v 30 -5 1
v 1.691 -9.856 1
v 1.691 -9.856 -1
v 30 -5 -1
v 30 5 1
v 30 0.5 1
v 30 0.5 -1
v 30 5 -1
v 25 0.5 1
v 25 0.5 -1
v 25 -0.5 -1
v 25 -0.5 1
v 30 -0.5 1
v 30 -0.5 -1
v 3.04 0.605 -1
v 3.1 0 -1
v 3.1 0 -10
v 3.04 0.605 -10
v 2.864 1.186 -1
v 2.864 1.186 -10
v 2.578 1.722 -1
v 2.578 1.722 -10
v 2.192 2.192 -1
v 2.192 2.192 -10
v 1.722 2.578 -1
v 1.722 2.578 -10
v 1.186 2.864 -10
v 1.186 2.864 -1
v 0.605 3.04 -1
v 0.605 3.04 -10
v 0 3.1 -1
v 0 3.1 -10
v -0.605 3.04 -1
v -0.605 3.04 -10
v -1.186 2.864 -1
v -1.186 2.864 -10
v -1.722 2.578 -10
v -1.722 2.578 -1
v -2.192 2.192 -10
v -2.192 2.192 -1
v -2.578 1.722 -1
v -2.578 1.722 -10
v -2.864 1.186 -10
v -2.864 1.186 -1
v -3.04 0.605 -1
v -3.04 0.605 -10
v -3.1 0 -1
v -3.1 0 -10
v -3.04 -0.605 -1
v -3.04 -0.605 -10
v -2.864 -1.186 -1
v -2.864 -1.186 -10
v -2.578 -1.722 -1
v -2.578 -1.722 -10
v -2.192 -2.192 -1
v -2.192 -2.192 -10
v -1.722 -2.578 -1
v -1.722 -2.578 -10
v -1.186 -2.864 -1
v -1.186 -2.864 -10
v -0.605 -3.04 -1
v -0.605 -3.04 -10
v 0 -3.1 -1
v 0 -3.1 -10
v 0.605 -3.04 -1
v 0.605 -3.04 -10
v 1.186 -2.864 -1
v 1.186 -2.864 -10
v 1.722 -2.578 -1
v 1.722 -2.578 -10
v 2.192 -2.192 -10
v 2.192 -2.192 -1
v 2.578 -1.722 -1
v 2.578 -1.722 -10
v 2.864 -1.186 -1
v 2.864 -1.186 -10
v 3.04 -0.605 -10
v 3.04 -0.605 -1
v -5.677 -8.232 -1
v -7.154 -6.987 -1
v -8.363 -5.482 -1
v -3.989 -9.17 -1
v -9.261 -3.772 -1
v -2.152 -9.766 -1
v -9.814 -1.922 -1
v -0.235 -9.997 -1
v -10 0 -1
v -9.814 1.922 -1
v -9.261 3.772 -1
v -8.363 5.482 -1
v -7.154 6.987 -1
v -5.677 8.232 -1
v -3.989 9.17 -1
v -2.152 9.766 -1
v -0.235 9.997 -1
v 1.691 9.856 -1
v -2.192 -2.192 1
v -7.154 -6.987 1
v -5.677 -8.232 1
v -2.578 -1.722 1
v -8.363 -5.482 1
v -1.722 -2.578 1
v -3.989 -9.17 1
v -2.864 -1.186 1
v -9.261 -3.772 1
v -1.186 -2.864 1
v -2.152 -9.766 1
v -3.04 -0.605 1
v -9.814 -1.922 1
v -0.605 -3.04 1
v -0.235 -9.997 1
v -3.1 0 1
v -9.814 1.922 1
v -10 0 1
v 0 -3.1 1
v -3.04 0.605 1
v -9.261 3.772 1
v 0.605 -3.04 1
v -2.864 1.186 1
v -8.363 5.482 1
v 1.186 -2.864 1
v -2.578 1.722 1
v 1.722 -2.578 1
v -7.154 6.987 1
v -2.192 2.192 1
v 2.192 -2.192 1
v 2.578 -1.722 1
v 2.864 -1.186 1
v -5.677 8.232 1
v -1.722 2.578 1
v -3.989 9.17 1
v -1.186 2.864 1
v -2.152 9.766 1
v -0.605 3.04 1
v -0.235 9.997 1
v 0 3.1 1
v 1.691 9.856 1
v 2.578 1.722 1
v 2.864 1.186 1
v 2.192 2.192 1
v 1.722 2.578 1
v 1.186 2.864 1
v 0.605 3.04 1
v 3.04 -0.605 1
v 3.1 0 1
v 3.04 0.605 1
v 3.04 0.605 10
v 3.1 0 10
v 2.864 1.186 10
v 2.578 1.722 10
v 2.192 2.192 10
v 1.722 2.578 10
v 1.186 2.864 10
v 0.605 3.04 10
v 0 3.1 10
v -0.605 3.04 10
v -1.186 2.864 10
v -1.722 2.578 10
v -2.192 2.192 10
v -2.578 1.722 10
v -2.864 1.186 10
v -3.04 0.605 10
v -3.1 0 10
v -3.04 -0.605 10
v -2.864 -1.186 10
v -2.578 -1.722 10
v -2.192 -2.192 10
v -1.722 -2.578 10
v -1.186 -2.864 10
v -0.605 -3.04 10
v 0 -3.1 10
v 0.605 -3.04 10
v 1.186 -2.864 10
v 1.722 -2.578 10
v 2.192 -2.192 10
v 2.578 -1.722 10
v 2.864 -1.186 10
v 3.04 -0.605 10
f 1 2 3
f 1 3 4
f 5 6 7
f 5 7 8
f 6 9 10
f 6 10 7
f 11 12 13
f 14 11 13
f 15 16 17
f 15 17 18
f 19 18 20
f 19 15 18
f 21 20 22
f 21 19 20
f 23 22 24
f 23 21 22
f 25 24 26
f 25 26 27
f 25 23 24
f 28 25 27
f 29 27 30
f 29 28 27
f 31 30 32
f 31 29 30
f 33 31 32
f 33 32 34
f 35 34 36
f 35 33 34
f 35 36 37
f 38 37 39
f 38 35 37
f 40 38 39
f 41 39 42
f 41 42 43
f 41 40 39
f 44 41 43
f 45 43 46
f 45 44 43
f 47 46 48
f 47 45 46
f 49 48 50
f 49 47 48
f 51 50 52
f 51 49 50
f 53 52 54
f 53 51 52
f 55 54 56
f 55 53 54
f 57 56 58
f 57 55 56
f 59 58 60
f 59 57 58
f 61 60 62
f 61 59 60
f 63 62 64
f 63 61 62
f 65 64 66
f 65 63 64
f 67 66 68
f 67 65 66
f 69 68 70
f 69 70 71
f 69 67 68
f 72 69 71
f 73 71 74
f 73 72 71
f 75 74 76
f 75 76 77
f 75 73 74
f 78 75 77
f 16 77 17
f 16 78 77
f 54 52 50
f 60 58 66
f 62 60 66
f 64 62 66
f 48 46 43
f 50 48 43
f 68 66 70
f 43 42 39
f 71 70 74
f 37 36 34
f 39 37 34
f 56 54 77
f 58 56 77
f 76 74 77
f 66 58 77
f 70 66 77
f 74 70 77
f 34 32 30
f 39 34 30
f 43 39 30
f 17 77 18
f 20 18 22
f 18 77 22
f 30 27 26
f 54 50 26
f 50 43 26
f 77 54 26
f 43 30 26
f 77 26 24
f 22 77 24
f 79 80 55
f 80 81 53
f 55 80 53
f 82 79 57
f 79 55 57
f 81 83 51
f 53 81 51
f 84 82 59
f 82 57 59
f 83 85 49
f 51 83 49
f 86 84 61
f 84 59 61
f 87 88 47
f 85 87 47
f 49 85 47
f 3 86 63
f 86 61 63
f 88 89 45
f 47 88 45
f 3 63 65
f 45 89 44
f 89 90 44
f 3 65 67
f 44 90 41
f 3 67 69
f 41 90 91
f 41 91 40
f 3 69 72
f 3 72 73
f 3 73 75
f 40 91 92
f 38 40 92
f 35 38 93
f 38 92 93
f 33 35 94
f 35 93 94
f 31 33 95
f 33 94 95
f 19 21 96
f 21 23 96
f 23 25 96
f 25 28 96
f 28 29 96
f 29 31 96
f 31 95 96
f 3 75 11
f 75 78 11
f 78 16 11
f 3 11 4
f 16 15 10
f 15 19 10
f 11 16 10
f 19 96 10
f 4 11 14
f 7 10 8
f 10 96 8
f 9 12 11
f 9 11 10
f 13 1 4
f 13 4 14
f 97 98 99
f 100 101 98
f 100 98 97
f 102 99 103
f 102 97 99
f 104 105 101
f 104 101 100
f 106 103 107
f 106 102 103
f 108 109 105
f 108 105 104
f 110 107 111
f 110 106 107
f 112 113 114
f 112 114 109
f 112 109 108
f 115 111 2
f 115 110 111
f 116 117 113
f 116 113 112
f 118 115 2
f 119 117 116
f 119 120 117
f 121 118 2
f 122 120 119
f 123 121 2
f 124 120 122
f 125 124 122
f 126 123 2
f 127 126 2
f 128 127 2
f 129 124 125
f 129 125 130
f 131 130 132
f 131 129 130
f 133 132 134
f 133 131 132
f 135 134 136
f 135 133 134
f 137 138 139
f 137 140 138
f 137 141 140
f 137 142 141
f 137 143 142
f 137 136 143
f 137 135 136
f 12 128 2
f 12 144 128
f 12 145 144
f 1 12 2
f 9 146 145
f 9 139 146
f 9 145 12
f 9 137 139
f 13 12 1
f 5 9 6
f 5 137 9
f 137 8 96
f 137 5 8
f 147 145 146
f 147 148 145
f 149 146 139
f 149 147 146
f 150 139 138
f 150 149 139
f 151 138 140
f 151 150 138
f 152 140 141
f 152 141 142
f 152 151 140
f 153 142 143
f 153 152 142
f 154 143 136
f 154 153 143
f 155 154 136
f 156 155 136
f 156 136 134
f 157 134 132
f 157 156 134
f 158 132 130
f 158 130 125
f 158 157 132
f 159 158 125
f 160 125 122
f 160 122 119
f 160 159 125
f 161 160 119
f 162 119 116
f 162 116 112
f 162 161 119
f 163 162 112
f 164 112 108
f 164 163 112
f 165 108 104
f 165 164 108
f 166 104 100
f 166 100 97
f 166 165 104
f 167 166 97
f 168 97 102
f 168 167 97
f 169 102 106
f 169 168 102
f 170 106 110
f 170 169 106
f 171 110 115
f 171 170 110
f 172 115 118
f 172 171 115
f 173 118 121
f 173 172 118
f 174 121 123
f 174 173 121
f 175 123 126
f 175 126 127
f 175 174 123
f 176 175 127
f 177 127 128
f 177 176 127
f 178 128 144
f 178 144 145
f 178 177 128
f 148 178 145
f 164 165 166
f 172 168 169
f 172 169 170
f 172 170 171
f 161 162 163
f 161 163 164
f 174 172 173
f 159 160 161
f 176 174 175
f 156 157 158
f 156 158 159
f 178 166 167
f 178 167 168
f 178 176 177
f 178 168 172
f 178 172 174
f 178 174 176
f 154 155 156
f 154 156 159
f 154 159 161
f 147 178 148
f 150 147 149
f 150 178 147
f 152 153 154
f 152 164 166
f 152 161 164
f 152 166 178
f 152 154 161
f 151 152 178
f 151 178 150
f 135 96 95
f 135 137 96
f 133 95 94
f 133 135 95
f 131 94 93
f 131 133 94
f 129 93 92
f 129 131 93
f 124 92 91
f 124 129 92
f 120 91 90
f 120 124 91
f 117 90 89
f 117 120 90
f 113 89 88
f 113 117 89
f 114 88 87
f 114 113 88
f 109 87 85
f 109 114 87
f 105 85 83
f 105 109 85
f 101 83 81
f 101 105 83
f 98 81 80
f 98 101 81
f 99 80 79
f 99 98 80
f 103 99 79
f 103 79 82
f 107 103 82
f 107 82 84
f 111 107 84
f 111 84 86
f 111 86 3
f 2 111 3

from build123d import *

# Parameters (mm, degrees)
F0_R     = 3.1
F1_DEPTH = 10
F2_DEPTH = 1
F3_W     = 5
F3_H     = 1
F4_DEPTH = 11.001


# Not quite as in the source:
# - a feature names something its author has since deleted; it is built from what else it names


with BuildPart() as f1:
    # F0 (on Top) → F1 (new body, symmetric)
    with BuildSketch(Plane.XY):
        Circle(F0_R)
    extrude(amount=F1_DEPTH, both=True)

    # F0 (on Top) → F2 (join, symmetric)
    with BuildSketch(Plane.XY):
        with BuildLine():
            ThreePointArc((1.6906573106, -9.8560477808), (7.645474907, -6.4456740103), (10, 0))
            ThreePointArc((10, 0), (7.6454749578, 6.44567395), (1.6906574661, 9.8560477542))
            ThreePointArc((1.6906574661, 9.8560477542), (-10, 7.89e-08), (1.6906573106, -9.8560477808))
        make_face()
        Circle(F0_R, mode=Mode.SUBTRACT)
        with BuildLine():
            ThreePointArc((1.6906574661, 9.8560477542), (7.6454749578, 6.44567395), (10, 0))
            ThreePointArc((10, 0), (7.645474907, -6.4456740103), (1.6906573106, -9.8560477808))
            Line((1.6906573106, -9.8560477808), (30, -5))
            Line((30, -5), (30, 5))
            Line((30, 5), (1.6906574661, 9.8560477542))
        make_face()
    extrude(amount=F2_DEPTH, both=True)

    # F3 (on face) → F4 (cut, through all)
    with BuildSketch(Plane.XY.offset(1)):
        with Locations((27.5, 0)):
            Rectangle(F3_W, F3_H)
    extrude(amount=-F4_DEPTH, mode=Mode.SUBTRACT)


solid = f1.part
